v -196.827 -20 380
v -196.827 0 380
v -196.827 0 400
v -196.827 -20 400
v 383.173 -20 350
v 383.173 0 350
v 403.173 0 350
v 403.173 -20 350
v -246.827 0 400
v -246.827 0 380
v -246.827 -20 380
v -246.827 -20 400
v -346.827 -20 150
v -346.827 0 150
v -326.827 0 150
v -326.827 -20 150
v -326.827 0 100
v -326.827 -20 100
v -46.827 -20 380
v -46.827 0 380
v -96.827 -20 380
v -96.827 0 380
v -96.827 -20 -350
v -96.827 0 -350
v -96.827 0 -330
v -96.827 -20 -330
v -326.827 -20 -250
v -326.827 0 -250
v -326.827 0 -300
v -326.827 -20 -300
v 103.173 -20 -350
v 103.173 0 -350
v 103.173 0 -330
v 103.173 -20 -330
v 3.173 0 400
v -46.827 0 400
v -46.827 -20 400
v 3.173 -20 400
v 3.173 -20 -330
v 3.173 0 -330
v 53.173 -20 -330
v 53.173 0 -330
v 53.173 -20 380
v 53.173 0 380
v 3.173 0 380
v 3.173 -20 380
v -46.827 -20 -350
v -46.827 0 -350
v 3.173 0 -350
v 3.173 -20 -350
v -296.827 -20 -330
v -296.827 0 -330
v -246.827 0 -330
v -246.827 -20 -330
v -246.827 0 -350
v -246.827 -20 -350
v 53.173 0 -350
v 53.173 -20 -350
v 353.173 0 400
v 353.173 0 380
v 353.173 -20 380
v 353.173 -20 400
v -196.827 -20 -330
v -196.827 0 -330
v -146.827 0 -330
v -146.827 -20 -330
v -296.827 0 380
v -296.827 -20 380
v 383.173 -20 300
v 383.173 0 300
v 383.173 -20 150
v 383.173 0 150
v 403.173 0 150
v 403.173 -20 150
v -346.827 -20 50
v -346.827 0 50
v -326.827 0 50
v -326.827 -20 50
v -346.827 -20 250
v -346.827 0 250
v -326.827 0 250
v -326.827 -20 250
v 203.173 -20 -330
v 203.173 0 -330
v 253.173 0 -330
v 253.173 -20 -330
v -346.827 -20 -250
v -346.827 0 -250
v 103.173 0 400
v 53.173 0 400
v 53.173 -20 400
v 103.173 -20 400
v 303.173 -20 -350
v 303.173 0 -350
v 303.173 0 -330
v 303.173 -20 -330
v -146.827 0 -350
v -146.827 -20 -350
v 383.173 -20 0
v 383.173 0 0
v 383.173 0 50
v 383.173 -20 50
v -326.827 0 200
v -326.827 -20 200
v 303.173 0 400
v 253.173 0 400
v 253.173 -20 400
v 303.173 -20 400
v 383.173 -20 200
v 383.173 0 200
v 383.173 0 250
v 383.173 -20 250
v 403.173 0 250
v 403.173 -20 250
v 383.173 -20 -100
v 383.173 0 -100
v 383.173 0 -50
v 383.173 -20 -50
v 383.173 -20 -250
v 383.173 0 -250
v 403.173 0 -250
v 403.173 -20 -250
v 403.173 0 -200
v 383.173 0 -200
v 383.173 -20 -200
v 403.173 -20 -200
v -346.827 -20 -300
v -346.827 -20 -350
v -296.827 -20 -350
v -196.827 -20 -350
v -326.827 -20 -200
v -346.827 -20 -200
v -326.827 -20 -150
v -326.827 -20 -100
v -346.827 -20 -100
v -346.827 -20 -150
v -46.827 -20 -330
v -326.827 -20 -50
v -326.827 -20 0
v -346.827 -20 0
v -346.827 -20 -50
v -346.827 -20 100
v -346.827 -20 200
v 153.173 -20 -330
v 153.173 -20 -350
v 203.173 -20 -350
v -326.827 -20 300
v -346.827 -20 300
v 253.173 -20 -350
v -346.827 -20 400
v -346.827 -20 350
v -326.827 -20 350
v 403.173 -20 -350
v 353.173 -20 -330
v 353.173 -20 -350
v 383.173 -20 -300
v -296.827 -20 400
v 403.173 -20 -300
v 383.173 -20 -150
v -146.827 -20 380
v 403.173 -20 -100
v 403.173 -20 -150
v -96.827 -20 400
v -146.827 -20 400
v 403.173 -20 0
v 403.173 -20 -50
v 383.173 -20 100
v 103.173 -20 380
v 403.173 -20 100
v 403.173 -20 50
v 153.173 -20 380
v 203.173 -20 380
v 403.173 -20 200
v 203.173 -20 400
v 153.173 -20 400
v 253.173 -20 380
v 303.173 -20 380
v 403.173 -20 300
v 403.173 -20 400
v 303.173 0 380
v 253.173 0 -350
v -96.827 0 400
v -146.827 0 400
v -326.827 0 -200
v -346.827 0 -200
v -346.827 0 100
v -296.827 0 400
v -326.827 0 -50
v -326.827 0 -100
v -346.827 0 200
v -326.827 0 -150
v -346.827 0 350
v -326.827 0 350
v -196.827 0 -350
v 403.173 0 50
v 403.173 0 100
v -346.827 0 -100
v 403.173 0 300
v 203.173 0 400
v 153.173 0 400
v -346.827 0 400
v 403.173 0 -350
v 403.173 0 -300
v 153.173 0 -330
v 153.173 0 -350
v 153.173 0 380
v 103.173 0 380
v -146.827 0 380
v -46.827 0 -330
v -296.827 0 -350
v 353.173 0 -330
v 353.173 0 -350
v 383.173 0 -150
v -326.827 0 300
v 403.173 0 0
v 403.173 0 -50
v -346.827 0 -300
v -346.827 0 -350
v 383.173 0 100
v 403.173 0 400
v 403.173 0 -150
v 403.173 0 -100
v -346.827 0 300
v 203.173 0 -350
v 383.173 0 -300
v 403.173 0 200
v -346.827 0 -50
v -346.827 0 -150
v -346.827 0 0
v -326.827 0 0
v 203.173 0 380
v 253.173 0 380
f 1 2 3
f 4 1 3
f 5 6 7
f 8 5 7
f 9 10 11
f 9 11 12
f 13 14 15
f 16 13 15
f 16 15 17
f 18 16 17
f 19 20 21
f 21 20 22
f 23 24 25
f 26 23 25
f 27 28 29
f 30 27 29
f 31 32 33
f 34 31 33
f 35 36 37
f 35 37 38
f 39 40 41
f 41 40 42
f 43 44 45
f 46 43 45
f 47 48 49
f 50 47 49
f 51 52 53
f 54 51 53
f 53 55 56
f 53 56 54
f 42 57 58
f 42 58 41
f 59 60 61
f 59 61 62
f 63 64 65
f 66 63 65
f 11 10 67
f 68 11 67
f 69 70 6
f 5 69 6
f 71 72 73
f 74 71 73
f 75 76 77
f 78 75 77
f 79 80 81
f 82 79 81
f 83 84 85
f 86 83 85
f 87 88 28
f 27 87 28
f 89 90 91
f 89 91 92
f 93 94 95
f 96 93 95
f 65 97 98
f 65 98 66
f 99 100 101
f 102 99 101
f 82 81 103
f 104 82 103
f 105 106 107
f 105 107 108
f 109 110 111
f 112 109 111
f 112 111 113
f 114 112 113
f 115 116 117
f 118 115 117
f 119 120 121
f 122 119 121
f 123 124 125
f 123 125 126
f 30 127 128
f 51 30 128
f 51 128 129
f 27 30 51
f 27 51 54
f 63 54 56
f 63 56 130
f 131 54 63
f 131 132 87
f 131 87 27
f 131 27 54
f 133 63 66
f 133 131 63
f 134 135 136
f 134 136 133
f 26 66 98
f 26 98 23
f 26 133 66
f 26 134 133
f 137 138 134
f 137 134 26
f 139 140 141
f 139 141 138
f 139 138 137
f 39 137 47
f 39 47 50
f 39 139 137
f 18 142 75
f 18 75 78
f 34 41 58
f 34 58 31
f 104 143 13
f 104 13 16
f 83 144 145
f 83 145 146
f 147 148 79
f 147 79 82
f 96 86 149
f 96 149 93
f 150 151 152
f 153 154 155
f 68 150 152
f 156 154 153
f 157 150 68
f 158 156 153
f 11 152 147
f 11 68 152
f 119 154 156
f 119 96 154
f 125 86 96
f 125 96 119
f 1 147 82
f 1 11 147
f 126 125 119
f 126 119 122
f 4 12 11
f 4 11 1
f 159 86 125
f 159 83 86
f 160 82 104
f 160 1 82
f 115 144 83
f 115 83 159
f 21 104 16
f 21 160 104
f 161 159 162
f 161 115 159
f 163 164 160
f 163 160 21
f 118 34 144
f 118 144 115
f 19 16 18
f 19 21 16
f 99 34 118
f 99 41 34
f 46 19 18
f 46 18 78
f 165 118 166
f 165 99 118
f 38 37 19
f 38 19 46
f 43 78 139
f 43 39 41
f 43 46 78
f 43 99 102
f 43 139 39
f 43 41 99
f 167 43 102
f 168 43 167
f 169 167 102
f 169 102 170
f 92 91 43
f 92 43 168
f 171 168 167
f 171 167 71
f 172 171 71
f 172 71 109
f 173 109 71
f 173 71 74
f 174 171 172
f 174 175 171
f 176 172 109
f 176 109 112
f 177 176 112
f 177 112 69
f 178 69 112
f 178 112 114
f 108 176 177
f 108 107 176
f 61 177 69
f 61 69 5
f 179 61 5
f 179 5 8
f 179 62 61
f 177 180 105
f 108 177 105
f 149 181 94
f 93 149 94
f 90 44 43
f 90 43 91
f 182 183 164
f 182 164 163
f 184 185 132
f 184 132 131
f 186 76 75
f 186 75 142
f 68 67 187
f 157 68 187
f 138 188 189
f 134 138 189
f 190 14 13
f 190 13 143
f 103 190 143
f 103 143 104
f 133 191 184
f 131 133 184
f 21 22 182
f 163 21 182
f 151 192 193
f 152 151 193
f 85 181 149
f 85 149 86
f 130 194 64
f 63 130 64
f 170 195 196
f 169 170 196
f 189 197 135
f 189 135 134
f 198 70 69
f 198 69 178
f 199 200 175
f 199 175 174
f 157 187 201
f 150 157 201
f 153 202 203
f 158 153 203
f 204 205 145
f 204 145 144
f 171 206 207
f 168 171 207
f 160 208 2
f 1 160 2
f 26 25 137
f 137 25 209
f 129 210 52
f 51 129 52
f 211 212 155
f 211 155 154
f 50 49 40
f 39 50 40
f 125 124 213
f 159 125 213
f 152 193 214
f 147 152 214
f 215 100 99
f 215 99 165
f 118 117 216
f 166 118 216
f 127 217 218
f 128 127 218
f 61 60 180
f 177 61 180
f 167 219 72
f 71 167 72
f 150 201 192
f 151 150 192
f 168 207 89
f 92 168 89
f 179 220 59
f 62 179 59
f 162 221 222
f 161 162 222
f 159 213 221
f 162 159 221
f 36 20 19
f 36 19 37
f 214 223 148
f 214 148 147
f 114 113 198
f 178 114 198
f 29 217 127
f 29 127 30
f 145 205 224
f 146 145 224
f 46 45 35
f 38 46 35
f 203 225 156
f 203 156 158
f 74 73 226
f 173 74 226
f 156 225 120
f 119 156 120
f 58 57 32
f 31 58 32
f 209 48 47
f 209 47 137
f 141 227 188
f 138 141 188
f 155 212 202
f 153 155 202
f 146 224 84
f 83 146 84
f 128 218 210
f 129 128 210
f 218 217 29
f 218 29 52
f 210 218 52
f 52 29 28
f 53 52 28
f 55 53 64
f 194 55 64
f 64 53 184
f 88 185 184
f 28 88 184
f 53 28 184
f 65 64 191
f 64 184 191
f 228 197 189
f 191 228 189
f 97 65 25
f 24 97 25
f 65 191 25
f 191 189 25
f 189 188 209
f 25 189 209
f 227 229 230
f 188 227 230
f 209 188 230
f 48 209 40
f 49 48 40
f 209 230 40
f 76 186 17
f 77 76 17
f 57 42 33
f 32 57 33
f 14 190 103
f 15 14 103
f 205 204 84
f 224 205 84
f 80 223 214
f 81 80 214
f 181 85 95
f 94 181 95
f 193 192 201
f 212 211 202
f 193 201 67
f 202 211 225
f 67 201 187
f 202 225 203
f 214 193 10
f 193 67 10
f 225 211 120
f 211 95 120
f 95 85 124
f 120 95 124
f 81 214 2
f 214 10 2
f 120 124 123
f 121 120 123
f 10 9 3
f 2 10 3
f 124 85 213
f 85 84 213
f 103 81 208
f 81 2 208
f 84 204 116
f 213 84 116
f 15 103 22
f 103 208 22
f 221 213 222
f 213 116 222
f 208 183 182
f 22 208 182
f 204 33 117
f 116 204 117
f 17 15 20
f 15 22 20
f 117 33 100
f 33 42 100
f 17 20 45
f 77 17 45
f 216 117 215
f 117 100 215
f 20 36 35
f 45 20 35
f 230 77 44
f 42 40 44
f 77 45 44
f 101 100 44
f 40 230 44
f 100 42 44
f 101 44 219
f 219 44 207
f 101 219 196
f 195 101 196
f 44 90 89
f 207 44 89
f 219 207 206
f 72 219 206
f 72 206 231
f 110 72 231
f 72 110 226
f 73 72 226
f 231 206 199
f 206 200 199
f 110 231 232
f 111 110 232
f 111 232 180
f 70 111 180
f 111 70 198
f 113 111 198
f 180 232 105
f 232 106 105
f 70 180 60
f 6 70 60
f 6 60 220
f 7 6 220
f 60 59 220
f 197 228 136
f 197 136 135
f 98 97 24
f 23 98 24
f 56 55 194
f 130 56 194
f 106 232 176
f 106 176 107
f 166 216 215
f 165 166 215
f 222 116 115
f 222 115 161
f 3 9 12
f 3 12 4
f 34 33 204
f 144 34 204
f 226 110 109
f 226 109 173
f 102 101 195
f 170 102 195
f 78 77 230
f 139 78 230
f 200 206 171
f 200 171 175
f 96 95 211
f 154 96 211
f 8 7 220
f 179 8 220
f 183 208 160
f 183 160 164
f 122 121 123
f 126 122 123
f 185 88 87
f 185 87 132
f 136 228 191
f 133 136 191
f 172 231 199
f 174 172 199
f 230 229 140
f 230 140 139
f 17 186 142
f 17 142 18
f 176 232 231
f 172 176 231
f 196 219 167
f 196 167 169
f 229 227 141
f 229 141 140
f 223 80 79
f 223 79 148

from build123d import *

# Parameters (mm, degrees)
F0_W     = 20
F0_H     = 20
F0_H_2   = 30
F0_W_2   = 30
F0_W_3   = 50
F0_H_3   = 50
F1_DEPTH = 20


with BuildPart() as f1:
    # F0 (on Front) → F1 (new body)
    with BuildSketch(Plane.XZ):
        with Locations((-336.827279, 390)):
            Rectangle(F0_W, F0_H)
        with Locations((-336.827279, 365)):
            Rectangle(F0_W, F0_H_2)
        with Locations((-311.827279, 390)):
            Rectangle(F0_W_2, F0_H)
        with Locations((-221.827279, 390)):
            Rectangle(F0_W_3, F0_H)
        with Locations((-121.827279, 390)):
            Rectangle(F0_W_3, F0_H)
        with Locations((-21.827279, 390)):
            Rectangle(F0_W_3, F0_H)
        with Locations((78.172721, 390)):
            Rectangle(F0_W_3, F0_H)
        with Locations((178.172721, 390)):
            Rectangle(F0_W_3, F0_H)
        with Locations((278.172721, 390)):
            Rectangle(F0_W_3, F0_H)
        with Locations((368.172721, 390)):
            Rectangle(F0_W_2, F0_H)
        with Locations((393.172721, 390)):
            Rectangle(F0_W, F0_H)
        with Locations((393.172721, 365)):
            Rectangle(F0_W, F0_H_2)
        with Locations((-336.827279, 275)):
            Rectangle(F0_W, F0_H_3)
        with Locations((-336.827279, 175)):
            Rectangle(F0_W, F0_H_3)
        with Locations((-336.827279, 75)):
            Rectangle(F0_W, F0_H_3)
        with Locations((-336.827279, -25)):
            Rectangle(F0_W, F0_H_3)
        with Locations((-336.827279, -125)):
            Rectangle(F0_W, F0_H_3)
        with Locations((-336.827279, -225)):
            Rectangle(F0_W, F0_H_3)
        with Locations((-336.827279, -315)):
            Rectangle(F0_W, F0_H_2)
        with Locations((-336.827279, -340)):
            Rectangle(F0_W, F0_H)
        with Locations((-311.827279, -340)):
            Rectangle(F0_W_2, F0_H)
        with Locations((-221.827279, -340)):
            Rectangle(F0_W_3, F0_H)
        with Locations((-121.827279, -340)):
            Rectangle(F0_W_3, F0_H)
        with Locations((-21.827279, -340)):
            Rectangle(F0_W_3, F0_H)
        with Locations((78.172721, -340)):
            Rectangle(F0_W_3, F0_H)
        with Locations((178.172721, -340)):
            Rectangle(F0_W_3, F0_H)
        with Locations((278.172721, -340)):
            Rectangle(F0_W_3, F0_H)
        with Locations((368.172721, -340)):
            Rectangle(F0_W_2, F0_H)
        with Locations((393.172721, -340)):
            Rectangle(F0_W, F0_H)
        with Locations((393.172721, -315)):
            Rectangle(F0_W, F0_H_2)
        with Locations((393.172721, -225)):
            Rectangle(F0_W, F0_H_3)
        with Locations((393.172721, -125)):
            Rectangle(F0_W, F0_H_3)
        with Locations((393.172721, -25)):
            Rectangle(F0_W, F0_H_3)
        with Locations((393.172721, 75)):
            Rectangle(F0_W, F0_H_3)
        with Locations((393.172721, 175)):
            Rectangle(F0_W, F0_H_3)
        with Locations((393.172721, 275)):
            Rectangle(F0_W, F0_H_3)
        Polygon((-296.827279, 380), (-326.827279, 380), (-326.827279, 350), (-326.827279, 300), (-326.827279, 250), (-326.827279, 200), (-326.827279, 150), (-326.827279, 100), (-326.827279, 50), (-326.827279, 0), (-326.827279, -50), (-326.827279, -100), (-326.827279, -150), (-326.827279, -200), (-326.827279, -250), (-326.827279, -300), (-326.827279, -330), (-296.827279, -330), (-246.827279, -330), (-196.827279, -330), (-146.827279, -330), (-96.827279, -330), (-46.827279, -330), (3.172721, -330), (53.172721, -330), (103.172721, -330), (153.172721, -330), (203.172721, -330), (253.172721, -330), (303.172721, -330), (353.172721, -330), (383.172721, -330), (383.172721, -300), (383.172721, -250), (383.172721, -200), (383.172721, -150), (383.172721, -100), (383.172721, -50), (383.172721, 0), (383.172721, 50), (383.172721, 100), (383.172721, 150), (383.172721, 200), (383.172721, 250), (383.172721, 300), (383.172721, 350), (383.172721, 380), (353.172721, 380), (303.172721, 380), (253.172721, 380), (203.172721, 380), (153.172721, 380), (103.172721, 380), (53.172721, 380), (3.172721, 380), (-46.827279, 380), (-96.827279, 380), (-146.827279, 380), (-196.827279, 380), (-246.827279, 380), align=None)
    extrude(amount=F1_DEPTH)


solid = f1.part
